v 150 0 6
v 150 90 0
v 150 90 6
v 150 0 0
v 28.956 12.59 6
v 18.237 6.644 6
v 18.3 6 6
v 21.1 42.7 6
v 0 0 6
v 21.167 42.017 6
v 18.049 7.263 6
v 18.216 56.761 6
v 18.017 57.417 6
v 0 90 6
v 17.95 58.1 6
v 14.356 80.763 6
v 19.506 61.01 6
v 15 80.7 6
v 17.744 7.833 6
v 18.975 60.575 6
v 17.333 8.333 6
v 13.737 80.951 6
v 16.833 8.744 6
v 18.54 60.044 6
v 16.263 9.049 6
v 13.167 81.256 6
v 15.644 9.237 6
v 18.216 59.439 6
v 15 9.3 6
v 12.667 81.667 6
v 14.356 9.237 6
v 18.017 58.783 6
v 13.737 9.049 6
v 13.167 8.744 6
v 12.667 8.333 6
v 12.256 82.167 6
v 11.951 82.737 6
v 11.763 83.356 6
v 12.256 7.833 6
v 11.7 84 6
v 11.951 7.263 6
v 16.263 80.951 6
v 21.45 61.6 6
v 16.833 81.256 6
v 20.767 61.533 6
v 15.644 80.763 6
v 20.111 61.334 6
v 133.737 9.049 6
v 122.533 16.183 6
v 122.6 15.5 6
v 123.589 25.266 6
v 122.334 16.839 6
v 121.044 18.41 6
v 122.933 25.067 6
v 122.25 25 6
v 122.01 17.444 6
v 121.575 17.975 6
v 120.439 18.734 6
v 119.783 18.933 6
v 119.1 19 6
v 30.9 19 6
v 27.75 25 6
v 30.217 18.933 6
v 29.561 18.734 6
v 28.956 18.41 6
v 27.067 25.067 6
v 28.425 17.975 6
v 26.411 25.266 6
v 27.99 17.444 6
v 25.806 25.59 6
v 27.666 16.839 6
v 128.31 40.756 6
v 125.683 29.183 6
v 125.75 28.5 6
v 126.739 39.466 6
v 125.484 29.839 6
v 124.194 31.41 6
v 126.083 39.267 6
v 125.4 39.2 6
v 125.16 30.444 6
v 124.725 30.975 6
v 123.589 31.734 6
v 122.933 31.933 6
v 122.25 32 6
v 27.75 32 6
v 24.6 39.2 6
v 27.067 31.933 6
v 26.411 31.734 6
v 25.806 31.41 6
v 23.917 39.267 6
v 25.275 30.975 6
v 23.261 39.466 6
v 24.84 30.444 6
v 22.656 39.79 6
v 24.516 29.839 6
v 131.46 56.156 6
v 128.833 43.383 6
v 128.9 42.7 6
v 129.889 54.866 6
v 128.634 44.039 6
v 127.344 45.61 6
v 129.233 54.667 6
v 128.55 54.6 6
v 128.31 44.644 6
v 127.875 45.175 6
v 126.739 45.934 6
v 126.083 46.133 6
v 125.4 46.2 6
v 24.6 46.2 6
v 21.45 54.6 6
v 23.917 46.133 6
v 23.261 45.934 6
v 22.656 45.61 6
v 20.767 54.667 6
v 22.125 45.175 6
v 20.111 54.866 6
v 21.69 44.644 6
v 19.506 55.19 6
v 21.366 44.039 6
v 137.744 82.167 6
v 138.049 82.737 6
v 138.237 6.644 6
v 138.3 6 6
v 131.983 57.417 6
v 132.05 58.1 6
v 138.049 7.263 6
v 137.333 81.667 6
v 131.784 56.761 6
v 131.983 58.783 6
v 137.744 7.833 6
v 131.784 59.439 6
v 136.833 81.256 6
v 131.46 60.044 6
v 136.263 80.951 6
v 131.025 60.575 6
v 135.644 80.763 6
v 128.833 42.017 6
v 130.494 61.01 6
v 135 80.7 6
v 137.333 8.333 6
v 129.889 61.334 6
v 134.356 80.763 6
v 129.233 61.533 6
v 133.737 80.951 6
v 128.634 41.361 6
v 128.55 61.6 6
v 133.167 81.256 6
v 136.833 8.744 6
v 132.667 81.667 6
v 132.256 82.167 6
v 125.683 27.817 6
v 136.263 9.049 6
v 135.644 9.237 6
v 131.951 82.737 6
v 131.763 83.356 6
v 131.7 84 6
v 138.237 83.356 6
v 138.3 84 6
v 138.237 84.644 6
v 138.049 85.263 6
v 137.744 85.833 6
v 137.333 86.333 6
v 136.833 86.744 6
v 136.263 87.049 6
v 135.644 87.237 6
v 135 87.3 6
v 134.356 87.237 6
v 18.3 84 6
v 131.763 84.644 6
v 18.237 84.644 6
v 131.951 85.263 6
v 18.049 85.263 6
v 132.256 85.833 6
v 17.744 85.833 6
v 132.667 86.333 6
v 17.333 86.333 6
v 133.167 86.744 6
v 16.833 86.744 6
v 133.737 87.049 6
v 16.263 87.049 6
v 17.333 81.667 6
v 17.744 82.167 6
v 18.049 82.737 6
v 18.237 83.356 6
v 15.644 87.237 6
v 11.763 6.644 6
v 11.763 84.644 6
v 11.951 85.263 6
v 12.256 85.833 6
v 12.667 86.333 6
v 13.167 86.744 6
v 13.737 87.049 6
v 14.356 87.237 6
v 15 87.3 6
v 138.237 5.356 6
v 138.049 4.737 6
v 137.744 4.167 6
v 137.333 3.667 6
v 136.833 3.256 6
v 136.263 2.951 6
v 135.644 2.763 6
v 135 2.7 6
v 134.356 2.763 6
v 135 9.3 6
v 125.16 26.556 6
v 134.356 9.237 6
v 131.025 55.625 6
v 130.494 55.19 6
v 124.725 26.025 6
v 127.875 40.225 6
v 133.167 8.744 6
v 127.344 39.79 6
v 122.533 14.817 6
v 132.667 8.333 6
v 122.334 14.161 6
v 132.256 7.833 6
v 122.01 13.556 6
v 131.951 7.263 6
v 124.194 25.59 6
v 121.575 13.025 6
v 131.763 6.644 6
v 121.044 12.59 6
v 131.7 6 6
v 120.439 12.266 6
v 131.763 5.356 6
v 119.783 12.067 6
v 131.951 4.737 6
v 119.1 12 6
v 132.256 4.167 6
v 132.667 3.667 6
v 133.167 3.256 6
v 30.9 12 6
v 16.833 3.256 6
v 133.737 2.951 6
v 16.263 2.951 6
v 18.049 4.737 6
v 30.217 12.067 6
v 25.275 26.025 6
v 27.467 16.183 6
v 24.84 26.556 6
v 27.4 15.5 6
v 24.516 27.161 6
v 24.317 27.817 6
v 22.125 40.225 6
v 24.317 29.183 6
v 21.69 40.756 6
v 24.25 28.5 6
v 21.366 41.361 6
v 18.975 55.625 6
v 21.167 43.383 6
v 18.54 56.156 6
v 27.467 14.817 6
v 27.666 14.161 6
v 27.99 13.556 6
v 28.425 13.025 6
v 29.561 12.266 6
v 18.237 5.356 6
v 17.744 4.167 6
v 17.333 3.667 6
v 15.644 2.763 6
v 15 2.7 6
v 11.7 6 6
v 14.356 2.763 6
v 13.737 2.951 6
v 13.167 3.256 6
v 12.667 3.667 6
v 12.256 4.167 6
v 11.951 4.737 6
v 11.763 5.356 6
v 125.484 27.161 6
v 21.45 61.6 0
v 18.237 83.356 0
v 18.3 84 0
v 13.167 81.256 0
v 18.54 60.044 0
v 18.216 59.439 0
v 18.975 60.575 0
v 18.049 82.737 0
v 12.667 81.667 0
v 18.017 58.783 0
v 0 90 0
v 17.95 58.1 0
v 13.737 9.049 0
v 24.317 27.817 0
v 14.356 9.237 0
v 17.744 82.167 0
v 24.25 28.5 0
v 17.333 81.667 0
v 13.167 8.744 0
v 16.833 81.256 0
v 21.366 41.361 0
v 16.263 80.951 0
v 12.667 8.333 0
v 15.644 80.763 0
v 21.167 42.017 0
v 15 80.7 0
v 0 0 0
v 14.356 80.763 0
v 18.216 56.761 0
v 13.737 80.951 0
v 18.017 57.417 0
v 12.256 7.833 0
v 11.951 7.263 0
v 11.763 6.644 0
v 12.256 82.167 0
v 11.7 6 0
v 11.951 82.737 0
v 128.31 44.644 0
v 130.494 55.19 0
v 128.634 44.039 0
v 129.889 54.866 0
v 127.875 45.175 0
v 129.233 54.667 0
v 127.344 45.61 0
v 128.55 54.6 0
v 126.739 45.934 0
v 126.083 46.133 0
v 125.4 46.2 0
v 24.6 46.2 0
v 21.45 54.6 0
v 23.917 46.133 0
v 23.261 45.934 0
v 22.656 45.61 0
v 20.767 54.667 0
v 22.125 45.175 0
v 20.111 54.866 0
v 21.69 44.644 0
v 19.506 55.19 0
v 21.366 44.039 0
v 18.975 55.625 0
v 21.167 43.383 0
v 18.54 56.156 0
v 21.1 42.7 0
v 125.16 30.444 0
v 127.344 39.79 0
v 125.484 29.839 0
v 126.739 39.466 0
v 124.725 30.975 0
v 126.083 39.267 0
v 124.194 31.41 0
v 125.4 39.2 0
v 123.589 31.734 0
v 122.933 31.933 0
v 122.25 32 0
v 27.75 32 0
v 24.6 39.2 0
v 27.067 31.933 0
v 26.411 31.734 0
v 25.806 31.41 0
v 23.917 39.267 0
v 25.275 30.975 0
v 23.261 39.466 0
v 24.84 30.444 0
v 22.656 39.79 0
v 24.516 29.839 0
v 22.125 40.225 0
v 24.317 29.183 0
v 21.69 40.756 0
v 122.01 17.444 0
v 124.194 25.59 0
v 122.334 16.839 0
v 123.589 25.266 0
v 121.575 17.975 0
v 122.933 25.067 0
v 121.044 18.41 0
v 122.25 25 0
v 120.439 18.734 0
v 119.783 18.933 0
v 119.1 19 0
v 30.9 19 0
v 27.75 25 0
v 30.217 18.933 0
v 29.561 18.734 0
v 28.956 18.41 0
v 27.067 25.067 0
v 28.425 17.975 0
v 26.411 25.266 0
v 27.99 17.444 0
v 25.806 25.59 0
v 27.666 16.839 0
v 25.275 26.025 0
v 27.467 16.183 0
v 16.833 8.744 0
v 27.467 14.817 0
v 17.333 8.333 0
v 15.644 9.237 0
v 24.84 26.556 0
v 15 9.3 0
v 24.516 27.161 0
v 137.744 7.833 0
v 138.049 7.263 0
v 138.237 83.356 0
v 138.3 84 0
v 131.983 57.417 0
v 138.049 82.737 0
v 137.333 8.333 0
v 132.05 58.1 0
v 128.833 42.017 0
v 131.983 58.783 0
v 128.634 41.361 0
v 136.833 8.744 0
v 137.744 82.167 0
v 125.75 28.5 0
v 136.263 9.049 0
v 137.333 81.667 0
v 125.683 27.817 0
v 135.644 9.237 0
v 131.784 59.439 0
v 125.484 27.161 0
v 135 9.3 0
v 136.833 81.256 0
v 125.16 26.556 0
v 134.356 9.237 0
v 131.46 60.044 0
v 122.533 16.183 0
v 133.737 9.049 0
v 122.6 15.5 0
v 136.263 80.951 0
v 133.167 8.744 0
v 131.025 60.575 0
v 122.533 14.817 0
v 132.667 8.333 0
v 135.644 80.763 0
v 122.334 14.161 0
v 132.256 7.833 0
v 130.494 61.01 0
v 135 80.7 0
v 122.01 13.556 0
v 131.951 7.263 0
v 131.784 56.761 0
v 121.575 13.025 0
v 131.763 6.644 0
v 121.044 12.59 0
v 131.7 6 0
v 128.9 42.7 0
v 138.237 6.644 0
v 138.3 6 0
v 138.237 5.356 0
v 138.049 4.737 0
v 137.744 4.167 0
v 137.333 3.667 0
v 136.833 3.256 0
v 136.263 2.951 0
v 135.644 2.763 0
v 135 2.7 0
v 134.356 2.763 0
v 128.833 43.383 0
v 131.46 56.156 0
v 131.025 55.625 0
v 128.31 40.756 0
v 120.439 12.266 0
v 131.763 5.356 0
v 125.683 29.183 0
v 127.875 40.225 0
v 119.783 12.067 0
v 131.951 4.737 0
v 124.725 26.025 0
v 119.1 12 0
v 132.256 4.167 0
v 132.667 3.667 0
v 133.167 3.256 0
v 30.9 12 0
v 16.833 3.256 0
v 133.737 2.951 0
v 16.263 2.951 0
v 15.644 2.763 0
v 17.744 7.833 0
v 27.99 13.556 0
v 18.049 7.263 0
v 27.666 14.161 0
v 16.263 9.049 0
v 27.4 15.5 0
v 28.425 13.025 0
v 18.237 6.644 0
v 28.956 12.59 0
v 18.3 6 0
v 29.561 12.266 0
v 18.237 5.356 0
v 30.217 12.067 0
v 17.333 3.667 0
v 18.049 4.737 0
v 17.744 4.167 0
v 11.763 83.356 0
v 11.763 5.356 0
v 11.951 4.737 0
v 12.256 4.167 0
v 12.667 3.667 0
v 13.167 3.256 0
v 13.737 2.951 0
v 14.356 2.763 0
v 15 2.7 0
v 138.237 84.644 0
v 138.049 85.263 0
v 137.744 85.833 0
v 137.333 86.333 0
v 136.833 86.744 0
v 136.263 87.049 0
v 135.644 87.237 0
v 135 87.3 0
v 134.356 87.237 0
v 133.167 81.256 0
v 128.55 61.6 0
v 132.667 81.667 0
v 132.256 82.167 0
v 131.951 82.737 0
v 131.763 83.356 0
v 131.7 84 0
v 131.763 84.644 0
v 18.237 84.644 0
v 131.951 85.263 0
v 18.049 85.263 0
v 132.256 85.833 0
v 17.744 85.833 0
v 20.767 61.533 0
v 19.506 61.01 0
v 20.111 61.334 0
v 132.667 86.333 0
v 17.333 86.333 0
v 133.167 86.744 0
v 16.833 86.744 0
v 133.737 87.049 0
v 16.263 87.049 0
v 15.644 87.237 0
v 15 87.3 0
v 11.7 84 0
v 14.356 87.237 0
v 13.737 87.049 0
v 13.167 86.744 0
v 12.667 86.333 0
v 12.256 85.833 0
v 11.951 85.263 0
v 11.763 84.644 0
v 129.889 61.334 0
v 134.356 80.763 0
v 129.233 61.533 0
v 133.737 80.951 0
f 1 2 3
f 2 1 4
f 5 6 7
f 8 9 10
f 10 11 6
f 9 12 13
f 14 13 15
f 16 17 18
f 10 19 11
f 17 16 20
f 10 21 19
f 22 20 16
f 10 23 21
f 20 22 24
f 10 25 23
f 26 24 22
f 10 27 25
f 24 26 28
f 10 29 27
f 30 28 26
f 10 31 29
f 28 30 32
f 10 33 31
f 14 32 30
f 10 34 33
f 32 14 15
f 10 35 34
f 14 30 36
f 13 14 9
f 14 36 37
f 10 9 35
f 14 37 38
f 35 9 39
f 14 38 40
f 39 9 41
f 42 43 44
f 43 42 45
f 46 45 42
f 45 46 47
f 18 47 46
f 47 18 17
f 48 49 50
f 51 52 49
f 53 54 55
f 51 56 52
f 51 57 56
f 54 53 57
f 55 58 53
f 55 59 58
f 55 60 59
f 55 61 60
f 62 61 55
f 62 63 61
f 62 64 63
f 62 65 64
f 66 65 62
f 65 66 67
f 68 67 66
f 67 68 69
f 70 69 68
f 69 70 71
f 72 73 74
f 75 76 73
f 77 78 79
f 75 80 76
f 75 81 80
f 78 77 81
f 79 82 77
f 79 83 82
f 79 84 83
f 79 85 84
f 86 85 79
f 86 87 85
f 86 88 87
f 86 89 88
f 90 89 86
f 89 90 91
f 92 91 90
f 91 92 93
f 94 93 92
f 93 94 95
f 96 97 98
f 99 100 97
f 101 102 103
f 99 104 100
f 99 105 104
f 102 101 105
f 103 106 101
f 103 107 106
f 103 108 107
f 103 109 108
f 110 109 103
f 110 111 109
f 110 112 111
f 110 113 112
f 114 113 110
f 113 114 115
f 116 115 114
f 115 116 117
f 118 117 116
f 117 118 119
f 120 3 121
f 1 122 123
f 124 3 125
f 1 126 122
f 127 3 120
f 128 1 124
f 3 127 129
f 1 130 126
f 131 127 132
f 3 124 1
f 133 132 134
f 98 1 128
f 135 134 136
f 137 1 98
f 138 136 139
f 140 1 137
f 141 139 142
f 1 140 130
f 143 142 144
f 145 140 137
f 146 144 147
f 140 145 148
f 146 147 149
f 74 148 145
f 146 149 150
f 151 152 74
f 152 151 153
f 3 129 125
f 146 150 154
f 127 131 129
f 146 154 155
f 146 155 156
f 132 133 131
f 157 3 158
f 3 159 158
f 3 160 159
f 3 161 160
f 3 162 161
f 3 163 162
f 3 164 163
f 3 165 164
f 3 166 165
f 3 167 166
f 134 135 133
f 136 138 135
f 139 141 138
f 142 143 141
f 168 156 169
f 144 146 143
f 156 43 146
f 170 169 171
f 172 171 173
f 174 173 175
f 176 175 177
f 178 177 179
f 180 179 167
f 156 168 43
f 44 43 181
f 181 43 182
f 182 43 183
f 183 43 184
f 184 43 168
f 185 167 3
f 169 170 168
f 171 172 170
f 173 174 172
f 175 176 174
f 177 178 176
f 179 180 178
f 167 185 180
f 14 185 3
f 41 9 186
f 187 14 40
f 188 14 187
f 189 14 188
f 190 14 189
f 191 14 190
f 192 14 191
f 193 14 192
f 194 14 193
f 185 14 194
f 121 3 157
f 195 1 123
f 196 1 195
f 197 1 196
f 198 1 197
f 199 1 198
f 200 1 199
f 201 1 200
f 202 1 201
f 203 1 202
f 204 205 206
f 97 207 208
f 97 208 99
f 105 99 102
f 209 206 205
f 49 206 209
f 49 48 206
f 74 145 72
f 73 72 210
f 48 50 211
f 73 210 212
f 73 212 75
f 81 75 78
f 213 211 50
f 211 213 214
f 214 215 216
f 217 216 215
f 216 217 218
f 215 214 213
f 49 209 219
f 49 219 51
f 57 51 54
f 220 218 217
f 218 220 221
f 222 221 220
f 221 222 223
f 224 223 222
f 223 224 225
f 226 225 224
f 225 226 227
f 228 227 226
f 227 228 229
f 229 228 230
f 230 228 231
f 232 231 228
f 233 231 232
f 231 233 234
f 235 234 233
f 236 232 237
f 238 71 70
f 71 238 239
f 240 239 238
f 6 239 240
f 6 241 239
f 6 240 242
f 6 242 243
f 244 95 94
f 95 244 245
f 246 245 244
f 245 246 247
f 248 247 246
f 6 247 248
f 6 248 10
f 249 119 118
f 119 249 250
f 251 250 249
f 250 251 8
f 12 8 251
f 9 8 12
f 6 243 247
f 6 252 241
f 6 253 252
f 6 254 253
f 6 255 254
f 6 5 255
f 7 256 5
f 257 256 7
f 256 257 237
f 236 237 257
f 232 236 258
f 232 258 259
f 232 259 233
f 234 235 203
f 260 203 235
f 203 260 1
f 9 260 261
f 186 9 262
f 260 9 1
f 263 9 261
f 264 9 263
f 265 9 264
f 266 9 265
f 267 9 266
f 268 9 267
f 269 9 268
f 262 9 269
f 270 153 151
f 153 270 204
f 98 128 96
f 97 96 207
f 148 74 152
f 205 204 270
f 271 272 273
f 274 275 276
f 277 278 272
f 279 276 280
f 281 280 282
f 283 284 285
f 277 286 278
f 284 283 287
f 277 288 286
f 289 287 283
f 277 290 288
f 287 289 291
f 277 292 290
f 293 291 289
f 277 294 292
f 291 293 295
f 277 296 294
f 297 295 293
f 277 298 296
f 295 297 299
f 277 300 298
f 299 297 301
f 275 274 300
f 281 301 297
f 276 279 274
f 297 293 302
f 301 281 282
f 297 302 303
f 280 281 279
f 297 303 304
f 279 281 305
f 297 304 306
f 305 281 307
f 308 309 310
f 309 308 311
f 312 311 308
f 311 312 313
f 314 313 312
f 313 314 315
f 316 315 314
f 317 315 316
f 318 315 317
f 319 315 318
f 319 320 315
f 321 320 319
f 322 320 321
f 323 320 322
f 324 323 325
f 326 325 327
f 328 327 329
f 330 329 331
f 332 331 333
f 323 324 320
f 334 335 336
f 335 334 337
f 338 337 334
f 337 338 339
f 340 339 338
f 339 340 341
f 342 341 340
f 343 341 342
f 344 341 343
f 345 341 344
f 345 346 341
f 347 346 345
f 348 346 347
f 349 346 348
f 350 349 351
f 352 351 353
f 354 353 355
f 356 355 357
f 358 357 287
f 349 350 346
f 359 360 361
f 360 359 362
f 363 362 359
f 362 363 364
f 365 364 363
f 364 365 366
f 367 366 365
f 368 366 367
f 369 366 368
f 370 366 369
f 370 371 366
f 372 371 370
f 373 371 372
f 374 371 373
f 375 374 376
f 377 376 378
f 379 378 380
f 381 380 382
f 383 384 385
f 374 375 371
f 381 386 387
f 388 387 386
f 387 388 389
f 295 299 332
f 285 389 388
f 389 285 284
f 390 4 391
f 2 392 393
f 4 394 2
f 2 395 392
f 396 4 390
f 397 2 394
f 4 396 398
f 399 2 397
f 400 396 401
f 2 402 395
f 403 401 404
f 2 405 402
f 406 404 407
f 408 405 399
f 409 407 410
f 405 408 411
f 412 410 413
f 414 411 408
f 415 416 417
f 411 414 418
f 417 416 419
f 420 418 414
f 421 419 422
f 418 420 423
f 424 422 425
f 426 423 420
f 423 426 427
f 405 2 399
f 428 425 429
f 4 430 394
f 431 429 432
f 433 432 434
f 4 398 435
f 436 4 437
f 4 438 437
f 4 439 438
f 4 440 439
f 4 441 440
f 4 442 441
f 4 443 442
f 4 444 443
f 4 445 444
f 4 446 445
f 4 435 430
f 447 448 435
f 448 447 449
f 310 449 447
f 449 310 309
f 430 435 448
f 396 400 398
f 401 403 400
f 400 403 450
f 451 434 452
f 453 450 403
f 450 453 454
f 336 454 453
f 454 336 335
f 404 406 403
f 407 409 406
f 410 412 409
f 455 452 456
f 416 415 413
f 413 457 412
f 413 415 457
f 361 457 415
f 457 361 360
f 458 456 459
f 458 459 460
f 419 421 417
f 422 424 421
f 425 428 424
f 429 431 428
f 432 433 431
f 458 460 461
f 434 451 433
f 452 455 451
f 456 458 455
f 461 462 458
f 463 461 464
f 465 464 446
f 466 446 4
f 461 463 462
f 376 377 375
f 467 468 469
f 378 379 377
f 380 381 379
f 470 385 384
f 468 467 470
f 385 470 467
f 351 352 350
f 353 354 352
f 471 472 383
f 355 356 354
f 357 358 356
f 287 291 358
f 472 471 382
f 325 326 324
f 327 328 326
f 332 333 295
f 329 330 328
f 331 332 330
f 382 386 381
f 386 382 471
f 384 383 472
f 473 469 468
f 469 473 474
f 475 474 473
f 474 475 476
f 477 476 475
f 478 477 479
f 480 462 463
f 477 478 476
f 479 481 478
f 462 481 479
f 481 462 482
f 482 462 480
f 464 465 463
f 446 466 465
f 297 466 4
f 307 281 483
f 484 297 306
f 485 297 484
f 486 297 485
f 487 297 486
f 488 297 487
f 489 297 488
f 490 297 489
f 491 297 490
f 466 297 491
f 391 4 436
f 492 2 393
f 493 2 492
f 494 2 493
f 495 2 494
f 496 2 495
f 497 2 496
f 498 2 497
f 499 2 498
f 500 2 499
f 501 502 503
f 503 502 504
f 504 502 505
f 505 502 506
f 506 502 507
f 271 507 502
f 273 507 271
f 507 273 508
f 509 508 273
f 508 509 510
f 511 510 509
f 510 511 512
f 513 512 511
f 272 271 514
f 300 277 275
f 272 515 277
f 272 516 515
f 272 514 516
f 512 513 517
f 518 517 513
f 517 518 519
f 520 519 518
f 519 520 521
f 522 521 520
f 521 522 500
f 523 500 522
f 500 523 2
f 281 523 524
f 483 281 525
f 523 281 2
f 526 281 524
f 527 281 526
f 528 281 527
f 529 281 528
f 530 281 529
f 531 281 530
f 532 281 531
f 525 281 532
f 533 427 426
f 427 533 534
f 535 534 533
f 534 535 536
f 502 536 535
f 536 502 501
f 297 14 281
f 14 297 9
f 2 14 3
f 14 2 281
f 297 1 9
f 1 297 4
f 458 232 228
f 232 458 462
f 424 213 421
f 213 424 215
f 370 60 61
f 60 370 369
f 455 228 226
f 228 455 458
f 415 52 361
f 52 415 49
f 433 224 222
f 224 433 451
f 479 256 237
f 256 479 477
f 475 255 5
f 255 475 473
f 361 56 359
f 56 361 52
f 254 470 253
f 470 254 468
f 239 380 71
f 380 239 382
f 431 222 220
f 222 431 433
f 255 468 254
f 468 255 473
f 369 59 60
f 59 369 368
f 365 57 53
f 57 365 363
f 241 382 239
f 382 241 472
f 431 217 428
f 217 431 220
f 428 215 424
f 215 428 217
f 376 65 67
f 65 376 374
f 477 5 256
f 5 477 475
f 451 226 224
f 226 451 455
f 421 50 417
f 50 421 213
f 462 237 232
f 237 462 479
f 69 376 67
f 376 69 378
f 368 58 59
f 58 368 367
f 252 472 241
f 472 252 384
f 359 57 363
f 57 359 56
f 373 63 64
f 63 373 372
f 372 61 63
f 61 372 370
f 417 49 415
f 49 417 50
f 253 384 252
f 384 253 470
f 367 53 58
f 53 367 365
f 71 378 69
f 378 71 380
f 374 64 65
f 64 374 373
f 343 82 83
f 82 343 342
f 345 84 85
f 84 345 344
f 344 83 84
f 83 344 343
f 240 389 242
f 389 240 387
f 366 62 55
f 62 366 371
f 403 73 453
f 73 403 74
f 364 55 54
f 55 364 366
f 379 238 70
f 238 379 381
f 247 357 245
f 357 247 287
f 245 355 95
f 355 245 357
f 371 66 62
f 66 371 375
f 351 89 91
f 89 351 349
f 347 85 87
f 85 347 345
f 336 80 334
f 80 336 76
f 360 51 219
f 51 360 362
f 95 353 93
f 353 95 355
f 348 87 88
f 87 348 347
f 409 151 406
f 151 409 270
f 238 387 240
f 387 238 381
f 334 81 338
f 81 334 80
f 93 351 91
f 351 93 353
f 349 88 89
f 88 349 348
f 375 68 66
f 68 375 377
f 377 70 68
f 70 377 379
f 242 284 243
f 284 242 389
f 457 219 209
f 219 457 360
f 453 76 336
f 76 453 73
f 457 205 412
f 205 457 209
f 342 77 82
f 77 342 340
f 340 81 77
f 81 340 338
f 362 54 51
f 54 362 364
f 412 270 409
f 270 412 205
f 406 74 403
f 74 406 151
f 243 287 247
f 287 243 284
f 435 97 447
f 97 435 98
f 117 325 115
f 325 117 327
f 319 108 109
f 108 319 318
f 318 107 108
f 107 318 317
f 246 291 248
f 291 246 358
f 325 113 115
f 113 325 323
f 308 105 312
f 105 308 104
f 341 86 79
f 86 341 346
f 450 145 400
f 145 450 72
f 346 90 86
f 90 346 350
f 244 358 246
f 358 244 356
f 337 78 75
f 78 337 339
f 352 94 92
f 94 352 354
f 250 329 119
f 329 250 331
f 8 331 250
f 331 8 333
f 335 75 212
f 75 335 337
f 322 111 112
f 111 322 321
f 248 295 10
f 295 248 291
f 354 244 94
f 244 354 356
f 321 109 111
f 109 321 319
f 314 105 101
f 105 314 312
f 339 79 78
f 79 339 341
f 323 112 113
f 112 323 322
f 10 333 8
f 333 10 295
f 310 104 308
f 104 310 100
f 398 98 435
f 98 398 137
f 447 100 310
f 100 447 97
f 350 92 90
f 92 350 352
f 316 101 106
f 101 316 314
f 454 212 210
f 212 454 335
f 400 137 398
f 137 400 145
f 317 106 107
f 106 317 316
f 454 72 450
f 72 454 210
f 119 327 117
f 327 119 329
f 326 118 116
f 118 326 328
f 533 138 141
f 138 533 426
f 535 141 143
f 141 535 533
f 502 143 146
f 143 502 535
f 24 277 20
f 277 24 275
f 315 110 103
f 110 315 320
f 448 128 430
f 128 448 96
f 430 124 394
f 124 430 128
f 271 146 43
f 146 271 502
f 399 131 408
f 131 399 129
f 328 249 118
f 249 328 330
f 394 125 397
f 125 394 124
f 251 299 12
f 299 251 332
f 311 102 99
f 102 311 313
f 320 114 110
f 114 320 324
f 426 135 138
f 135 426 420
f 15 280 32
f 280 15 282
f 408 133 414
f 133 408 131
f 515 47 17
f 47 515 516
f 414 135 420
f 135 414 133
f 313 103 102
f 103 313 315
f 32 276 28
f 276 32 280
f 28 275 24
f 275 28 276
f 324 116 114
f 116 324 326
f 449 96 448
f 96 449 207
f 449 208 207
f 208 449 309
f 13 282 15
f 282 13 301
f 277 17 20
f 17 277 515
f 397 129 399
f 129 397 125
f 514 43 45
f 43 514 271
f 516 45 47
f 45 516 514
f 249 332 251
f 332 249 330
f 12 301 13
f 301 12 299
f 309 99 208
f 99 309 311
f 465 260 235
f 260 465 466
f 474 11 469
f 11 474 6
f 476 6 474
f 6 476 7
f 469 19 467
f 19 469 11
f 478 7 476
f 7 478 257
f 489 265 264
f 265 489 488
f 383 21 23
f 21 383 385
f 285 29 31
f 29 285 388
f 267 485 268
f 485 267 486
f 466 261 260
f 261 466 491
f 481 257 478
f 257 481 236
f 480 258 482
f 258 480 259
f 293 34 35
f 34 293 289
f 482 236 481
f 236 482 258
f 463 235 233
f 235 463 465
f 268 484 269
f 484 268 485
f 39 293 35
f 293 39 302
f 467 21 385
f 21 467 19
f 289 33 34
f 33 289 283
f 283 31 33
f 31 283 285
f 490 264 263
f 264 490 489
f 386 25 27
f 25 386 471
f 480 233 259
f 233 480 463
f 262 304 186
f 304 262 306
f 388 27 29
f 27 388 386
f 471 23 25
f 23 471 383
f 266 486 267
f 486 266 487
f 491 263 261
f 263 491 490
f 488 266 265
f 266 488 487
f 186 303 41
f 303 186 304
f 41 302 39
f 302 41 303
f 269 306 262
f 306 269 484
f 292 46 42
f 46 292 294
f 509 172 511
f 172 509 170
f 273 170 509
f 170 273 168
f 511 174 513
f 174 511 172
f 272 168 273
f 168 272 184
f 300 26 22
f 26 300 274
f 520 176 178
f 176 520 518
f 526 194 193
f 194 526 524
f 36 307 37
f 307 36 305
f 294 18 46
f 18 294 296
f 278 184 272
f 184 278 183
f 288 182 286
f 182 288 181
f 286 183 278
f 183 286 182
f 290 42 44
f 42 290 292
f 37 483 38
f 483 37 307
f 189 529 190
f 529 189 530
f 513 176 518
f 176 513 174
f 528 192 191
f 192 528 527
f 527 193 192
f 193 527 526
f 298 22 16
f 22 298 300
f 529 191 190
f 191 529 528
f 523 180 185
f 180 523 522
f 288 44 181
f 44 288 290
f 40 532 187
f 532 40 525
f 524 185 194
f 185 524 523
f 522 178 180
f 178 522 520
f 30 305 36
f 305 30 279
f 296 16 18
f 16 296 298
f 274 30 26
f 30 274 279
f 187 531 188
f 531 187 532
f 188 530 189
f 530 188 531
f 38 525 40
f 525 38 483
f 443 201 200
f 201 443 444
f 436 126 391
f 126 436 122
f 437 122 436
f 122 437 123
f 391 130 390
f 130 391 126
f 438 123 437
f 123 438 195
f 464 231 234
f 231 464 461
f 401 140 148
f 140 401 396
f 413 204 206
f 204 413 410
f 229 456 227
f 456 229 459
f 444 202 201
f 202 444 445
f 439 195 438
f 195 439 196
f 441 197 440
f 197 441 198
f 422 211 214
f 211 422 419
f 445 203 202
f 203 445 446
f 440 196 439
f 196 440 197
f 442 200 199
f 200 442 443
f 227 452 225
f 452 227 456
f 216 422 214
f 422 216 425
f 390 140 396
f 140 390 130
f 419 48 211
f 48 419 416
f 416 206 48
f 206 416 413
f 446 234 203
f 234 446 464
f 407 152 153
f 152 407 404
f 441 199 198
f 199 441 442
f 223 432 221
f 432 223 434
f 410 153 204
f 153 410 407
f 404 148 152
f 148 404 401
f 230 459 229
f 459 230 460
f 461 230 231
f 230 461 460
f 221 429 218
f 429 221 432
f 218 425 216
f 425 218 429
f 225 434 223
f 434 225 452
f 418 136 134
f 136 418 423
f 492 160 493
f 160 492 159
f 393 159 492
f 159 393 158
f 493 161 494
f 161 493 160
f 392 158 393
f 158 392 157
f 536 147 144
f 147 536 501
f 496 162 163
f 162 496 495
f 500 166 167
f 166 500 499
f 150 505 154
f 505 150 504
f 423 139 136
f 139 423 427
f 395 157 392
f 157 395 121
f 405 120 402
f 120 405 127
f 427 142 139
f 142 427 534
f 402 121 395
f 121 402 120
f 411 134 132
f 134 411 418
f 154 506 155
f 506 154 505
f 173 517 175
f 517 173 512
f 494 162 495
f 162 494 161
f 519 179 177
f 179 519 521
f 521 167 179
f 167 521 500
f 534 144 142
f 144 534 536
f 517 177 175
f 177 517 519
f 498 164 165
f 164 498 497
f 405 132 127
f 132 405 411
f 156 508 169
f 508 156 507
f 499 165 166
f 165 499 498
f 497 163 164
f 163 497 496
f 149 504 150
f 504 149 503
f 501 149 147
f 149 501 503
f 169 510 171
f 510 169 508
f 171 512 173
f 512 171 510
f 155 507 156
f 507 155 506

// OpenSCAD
$fn = 32;

// ----------------------------------------------------------------------
// Slotted panel: 150 x 90 mm, 4 ряда of slots
// ----------------------------------------------------------------------

// --- parameters (mm) ---
panel_w = 150;            // panel width
panel_d = 90;             // panel depth
thick = 6;                // panel thickness
slot_w = 7;               // slot width
pitch0 = 13;              // first row pitch
pitch_step = 1.2;         // pitch increase per row
margin = 12;              // margin around the slot field
rows = 4;                 // number of slot rows
mount_d = 6.6;            // mounting holes
mount_x = 60;             // mounting hole offset

difference() {
  union() {
    cube([panel_w, panel_d, thick]);
  }
  /* slot rows: stadium shaped cutters, 2.5 mm clear of both faces */
  /* row 0: pitch 13, length 88.2 */
  hull() {
    translate([30.9, 15.5, -2.5]) cylinder(h = thick + 5, d = slot_w);
    translate([119.1, 15.5, -2.5]) cylinder(h = thick + 5, d = slot_w);
  }
  /* row 1: pitch 14.2, length 94.5 */
  hull() {
    translate([27.75, 28.5, -2.5]) cylinder(h = thick + 5, d = slot_w);
    translate([122.25, 28.5, -2.5]) cylinder(h = thick + 5, d = slot_w);
  }
  /* row 2: pitch 15.4, length 100.8 */
  hull() {
    translate([24.6, 42.7, -2.5]) cylinder(h = thick + 5, d = slot_w);
    translate([125.4, 42.7, -2.5]) cylinder(h = thick + 5, d = slot_w);
  }
  /* row 3: pitch 16.6, length 107.1 */
  hull() {
    translate([21.45, 58.1, -2.5]) cylinder(h = thick + 5, d = slot_w);
    translate([128.55, 58.1, -2.5]) cylinder(h = thick + 5, d = slot_w);
  }
  translate([15, 6, -2.5]) cylinder(h = 11, d = mount_d);
  translate([15, 84, -2.5]) cylinder(h = 11, d = mount_d);
  translate([135, 6, -2.5]) cylinder(h = 11, d = mount_d);
  translate([135, 84, -2.5]) cylinder(h = 11, d = mount_d);
}
